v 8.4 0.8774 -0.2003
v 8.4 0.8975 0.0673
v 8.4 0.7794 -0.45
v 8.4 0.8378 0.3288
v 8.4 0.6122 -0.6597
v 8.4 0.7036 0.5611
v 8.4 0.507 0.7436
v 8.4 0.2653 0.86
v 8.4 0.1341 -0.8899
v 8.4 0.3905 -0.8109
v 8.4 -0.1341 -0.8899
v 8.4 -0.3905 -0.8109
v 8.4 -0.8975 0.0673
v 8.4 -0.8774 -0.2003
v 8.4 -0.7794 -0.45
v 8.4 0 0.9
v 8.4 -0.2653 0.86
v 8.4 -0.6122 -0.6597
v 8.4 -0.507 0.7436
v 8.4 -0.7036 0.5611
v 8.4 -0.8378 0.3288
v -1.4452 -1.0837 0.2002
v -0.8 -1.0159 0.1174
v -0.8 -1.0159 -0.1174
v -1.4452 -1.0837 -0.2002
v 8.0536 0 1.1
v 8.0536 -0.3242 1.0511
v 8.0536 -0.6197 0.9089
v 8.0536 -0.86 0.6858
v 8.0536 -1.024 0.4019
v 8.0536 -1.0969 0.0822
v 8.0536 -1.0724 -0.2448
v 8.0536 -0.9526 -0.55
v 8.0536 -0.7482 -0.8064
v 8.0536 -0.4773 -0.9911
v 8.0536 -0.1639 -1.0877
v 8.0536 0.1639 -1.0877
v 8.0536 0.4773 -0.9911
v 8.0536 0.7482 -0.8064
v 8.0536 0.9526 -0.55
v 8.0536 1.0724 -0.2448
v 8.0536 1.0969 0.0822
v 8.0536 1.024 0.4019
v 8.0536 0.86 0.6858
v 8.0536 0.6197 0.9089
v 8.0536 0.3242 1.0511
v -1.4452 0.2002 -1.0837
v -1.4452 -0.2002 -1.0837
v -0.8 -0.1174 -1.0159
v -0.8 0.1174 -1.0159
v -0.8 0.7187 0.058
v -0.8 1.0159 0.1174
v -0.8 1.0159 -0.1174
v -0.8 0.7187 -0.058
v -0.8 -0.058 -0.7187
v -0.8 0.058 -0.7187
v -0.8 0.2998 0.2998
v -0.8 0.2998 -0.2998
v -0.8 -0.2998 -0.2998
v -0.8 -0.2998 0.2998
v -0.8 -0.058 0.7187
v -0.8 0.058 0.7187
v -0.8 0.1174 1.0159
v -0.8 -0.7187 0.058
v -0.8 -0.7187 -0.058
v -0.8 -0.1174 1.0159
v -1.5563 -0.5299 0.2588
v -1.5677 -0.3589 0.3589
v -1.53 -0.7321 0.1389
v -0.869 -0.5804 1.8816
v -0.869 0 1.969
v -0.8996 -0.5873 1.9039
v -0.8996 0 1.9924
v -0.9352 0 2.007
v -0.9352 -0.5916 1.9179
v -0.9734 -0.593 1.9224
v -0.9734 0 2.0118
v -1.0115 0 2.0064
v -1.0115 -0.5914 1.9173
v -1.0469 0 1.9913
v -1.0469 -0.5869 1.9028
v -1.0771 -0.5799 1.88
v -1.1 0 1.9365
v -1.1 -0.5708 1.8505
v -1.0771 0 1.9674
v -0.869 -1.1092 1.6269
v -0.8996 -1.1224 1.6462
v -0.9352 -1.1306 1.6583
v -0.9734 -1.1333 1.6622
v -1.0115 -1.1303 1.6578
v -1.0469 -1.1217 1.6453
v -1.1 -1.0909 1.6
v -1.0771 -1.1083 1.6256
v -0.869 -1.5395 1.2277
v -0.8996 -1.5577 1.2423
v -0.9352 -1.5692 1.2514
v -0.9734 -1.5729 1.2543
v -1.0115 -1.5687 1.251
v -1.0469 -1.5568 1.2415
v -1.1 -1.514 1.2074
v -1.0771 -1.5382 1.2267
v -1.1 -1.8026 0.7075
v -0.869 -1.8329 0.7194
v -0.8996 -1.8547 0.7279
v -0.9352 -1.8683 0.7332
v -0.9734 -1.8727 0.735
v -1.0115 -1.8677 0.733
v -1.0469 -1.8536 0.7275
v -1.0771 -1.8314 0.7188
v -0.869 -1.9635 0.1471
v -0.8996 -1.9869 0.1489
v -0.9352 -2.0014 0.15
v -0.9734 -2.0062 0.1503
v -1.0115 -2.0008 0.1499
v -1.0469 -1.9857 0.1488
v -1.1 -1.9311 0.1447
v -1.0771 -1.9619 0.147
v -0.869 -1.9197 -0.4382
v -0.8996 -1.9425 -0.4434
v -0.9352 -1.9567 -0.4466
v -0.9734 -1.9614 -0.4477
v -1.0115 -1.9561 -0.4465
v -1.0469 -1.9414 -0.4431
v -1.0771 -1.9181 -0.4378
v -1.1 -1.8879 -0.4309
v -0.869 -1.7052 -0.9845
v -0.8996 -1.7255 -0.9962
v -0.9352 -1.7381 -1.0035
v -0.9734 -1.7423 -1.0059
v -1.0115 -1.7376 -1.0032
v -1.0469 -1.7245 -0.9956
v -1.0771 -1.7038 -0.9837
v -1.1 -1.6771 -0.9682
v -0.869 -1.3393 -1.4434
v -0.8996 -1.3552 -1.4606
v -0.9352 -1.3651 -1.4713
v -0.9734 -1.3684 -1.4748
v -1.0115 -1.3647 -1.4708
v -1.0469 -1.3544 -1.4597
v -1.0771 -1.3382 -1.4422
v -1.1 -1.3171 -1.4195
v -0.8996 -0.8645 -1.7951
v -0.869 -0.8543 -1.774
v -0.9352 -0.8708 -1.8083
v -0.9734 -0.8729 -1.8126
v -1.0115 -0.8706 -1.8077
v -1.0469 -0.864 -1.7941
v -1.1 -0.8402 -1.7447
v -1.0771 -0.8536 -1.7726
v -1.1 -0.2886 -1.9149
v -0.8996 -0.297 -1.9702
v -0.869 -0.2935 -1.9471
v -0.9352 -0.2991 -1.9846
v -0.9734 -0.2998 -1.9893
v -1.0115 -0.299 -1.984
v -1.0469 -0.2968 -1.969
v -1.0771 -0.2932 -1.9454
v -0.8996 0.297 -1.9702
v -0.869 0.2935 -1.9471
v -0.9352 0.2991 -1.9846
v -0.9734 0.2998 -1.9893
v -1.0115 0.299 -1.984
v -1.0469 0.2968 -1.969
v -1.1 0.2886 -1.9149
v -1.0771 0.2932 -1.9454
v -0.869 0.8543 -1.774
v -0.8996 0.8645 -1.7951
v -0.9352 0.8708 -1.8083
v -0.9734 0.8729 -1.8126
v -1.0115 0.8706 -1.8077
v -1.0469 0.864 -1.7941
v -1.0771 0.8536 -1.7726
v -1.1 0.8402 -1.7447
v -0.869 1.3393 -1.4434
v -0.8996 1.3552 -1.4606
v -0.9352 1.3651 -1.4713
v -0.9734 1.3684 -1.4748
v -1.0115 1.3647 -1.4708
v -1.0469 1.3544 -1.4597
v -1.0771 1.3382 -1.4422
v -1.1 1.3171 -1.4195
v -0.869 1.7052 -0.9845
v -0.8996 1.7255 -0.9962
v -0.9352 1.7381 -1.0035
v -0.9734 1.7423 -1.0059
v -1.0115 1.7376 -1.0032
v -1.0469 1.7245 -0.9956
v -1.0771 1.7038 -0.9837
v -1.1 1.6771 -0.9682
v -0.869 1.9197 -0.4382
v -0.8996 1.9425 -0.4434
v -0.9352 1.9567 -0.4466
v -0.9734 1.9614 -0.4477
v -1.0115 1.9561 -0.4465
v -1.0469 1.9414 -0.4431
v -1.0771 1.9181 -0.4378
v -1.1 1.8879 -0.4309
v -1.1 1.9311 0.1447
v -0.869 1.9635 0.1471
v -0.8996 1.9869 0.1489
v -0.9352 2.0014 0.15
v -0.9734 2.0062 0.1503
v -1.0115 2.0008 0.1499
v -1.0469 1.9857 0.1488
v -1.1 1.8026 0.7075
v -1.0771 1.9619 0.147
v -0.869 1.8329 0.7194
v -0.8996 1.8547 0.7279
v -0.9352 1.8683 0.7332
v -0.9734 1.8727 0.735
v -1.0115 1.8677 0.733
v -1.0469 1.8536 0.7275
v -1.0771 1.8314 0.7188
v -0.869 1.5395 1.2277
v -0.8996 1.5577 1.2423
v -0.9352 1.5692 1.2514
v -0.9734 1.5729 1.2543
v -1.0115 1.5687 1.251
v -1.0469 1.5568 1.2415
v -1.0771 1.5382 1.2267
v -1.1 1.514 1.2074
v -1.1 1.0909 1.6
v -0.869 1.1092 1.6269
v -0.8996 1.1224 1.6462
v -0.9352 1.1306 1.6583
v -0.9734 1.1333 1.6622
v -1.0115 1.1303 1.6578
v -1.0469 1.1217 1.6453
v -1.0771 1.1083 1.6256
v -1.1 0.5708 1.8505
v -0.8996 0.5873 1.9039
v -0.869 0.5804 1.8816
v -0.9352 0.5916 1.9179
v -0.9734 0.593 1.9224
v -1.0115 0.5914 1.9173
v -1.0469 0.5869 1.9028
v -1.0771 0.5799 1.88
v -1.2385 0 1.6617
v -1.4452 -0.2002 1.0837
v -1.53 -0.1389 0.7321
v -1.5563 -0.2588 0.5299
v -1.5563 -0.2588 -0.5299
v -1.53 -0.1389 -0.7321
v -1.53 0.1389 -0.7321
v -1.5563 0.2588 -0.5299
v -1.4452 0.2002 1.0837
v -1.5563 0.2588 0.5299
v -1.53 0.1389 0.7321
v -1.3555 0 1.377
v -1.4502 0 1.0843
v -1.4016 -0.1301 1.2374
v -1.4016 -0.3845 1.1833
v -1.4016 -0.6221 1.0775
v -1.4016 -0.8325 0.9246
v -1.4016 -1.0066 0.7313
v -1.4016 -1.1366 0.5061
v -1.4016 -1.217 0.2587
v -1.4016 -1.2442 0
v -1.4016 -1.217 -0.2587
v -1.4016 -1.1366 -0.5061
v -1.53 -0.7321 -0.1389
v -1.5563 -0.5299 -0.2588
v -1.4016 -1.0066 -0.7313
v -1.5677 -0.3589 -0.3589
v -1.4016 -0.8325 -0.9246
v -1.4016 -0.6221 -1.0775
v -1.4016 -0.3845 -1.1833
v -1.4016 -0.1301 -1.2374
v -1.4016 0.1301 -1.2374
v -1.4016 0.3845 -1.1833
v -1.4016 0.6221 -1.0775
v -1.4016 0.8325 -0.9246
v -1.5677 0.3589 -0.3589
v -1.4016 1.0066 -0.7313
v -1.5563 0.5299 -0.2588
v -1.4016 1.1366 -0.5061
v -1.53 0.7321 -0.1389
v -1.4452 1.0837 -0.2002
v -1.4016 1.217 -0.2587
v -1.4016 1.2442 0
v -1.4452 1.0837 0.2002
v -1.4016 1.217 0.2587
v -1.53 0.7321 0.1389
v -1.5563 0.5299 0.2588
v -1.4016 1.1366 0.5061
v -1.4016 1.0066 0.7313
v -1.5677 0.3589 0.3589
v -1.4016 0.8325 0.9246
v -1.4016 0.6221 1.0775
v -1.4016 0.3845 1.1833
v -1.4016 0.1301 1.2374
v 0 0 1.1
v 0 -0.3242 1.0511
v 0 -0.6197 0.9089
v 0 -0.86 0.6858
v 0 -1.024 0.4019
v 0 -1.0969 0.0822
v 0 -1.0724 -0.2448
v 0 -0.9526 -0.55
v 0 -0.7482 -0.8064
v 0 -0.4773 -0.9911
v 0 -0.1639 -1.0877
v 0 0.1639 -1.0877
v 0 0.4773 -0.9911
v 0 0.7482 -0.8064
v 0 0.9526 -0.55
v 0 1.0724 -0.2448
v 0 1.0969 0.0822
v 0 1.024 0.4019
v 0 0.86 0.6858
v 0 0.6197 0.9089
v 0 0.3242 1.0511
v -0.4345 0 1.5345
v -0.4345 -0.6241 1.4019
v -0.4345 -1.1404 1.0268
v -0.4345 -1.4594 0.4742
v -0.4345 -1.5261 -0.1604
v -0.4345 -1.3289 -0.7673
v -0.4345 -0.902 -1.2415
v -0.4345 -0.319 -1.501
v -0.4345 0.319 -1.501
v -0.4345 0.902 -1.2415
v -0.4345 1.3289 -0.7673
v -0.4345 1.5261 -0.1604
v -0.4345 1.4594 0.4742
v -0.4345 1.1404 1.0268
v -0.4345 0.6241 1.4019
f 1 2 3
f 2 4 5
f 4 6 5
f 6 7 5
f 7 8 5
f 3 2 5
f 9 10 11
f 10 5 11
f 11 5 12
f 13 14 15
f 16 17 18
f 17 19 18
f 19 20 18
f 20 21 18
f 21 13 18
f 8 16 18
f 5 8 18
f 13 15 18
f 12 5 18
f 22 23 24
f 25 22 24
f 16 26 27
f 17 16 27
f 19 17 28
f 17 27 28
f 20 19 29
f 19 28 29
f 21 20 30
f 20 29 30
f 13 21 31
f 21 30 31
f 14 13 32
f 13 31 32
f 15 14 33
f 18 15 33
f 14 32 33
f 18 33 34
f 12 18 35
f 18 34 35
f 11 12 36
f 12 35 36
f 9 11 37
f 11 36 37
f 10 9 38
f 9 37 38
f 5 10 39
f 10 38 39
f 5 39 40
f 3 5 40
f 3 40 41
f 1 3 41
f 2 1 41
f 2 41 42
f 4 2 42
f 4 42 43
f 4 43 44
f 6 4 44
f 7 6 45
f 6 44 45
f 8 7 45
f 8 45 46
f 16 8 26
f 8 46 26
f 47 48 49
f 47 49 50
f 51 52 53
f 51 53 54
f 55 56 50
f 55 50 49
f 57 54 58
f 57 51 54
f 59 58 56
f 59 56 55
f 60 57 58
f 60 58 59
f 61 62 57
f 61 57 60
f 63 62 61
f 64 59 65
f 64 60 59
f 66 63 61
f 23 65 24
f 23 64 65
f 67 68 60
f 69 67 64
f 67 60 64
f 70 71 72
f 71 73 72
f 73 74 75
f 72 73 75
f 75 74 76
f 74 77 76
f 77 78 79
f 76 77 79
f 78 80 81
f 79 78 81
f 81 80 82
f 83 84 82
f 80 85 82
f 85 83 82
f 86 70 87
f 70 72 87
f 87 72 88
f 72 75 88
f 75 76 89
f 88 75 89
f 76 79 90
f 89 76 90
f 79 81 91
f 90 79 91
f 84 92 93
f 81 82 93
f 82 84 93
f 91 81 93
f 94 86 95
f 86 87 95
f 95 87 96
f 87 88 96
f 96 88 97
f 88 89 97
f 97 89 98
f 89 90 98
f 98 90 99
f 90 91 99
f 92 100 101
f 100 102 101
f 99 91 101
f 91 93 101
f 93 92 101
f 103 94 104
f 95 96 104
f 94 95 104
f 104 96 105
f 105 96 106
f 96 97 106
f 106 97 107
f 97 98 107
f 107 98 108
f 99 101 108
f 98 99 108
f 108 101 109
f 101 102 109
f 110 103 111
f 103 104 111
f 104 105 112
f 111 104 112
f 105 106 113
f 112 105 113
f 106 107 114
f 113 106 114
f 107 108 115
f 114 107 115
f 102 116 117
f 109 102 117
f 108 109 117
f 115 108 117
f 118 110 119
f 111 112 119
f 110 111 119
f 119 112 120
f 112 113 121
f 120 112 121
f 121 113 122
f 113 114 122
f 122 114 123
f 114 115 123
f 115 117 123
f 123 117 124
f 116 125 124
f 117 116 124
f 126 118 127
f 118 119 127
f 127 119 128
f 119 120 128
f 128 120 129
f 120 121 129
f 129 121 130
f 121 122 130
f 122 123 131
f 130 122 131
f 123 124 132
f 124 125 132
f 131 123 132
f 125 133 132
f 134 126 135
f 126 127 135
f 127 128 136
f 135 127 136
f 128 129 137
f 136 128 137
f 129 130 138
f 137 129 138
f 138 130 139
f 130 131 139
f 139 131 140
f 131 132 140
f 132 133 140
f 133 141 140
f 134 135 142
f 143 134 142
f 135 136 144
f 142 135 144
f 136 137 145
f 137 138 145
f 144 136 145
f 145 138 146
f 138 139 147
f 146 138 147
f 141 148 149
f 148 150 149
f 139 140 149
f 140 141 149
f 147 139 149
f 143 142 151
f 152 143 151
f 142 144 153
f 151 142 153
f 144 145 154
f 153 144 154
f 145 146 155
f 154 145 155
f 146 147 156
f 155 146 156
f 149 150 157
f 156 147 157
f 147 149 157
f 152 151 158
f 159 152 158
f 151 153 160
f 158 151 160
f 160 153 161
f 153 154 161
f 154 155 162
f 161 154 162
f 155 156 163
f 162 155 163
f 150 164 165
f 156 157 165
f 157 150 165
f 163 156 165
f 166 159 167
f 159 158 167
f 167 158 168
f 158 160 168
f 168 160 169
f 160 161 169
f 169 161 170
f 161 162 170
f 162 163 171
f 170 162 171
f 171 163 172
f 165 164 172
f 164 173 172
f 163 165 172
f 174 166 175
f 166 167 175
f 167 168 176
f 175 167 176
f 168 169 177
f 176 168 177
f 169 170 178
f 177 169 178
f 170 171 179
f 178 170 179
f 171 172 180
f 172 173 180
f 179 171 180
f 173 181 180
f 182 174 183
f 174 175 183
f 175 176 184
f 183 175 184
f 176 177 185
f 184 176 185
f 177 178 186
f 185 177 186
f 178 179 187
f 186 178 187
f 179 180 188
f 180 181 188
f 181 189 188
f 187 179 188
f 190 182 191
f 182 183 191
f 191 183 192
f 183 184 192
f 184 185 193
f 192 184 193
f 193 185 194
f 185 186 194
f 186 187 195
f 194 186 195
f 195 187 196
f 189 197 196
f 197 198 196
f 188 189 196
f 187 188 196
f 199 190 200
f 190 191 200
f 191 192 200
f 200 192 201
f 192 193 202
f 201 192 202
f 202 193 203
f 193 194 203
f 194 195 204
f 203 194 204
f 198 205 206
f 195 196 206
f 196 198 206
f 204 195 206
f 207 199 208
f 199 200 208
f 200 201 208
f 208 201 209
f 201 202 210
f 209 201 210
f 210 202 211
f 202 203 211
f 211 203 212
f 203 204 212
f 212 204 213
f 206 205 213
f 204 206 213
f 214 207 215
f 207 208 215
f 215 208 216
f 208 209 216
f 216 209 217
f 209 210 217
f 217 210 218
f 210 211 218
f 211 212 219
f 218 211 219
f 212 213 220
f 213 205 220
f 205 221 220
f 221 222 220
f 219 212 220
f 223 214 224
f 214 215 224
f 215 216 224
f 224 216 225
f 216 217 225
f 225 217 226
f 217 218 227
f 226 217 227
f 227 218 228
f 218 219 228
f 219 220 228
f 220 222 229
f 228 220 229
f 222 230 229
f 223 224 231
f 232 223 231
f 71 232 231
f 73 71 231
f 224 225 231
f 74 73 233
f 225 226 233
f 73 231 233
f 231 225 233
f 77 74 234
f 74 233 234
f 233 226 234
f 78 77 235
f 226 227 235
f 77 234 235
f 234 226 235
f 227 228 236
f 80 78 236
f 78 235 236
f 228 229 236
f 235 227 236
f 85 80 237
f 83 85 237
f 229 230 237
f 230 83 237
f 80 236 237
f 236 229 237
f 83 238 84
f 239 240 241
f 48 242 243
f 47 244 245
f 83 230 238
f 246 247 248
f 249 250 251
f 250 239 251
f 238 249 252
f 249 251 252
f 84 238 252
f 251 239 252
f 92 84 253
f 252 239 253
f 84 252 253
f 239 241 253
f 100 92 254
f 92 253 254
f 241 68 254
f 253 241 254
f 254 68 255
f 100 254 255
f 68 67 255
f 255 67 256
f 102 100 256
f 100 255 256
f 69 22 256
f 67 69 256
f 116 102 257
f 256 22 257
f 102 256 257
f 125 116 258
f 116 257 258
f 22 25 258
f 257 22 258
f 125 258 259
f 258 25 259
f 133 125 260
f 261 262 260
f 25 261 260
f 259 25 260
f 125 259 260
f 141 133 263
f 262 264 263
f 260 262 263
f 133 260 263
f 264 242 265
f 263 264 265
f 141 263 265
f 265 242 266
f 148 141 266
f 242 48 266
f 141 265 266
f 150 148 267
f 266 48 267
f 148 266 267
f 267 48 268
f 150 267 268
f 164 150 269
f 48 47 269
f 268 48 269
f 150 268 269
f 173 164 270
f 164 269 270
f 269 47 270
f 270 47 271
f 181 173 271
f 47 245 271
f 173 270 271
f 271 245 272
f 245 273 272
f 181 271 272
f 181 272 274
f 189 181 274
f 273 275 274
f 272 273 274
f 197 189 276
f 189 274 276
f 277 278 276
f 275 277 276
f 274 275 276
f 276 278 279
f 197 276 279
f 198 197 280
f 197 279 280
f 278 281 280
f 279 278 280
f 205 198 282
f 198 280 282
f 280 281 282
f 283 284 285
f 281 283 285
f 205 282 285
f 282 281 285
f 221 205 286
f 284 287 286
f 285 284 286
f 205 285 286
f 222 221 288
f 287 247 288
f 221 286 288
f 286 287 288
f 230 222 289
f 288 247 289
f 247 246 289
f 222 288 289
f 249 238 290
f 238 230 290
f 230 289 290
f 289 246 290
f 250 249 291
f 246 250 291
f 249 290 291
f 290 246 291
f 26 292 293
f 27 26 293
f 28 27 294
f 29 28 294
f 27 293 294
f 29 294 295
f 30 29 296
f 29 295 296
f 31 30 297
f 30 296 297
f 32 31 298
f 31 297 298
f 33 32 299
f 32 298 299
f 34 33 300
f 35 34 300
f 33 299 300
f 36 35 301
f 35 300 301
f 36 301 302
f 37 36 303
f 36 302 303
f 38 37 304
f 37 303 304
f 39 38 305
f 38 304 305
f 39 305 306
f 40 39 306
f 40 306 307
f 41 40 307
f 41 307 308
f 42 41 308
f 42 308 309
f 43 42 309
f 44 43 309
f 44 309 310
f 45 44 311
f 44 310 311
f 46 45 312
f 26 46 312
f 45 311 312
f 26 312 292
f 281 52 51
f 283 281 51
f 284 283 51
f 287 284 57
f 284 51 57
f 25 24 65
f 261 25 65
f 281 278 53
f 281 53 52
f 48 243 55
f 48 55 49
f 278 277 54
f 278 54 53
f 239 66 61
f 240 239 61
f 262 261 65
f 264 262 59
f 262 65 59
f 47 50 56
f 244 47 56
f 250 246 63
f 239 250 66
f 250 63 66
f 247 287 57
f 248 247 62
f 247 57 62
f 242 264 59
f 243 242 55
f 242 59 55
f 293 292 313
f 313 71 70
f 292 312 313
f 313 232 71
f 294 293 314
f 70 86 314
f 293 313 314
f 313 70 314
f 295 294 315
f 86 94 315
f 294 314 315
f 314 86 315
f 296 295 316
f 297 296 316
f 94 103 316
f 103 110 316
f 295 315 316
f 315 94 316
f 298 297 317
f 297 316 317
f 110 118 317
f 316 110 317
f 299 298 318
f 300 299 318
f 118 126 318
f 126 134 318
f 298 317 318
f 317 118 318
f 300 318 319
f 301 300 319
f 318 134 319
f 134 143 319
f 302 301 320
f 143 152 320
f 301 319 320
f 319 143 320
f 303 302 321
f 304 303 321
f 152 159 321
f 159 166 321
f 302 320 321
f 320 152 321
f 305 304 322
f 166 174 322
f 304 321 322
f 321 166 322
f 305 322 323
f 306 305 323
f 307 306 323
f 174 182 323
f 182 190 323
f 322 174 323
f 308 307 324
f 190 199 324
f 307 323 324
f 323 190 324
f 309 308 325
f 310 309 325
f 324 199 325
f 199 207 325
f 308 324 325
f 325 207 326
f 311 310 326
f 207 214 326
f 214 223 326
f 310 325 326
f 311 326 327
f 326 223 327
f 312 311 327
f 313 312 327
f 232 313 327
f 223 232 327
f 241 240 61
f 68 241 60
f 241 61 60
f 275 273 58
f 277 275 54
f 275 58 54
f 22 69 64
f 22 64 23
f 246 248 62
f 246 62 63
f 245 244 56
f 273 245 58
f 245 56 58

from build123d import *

# Parameters (mm, degrees)
CHAMFER1_SIZE      = 0.2
CHAMFER1_SIZE2     = 0.346410162
CUT_EXTRUDE1_DEPTH = 0.8
CUT_EXTRUDE1_TAPER = 6


with BuildPart() as part:
    # Sketch1 → Revolve1 (revolve)
    with BuildSketch(Plane.XY, mode=Mode.PRIVATE) as revolve1_sk:
        with BuildLine():
            Line((-1.6, 0), (8.4, 0))
            Line((8.4, 0), (8.4, 1.1))
            Line((8.4, 1.1), (0, 1.1))
            Line((0, 1.1), (-0.869043005, 1.969043005))
            ThreePointArc((-0.869043005, 1.969043005), (-0.992640239, 2.010371092), (-1.1, 1.936491673))
            ThreePointArc((-1.1, 1.936491673), (-1.472983346, 1), (-1.6, 0))
        make_face()
    revolve(revolve1_sk.sketch.rotate(Axis((0, 0, 0), (1, 0, 0)), 90), axis=Axis((0, 0, 0), (1, 0, 0)))

    # Chamfer1
    chamfer1_edges = [part.edges().sort_by_distance(p)[0] for p in [
        (8.4, 0, -1.1),
    ]]
    chamfer1_side = [part.faces().sort_by_distance(p)[0] for p in [
        (8.4, 0, 0),
    ]]
    chamfer(chamfer1_edges, length=CHAMFER1_SIZE, length2=CHAMFER1_SIZE2, reference=chamfer1_side[0])

    # Sketch3 → Cut-Extrude1 (cut)
    with BuildSketch(Plane(origin=(-1.6, 0, 0), x_dir=(0, 0, -1), z_dir=(1, 0, 0))):
        Polygon((-0.22, 1.1), (-0.146666667, 0.733333333), (-0.36140157, 0.36140157), (-0.733333333, 0.146666667), (-1.1, 0.22), (-1.1, -0.22), (-0.733333333, -0.146666667), (-0.36140157, -0.36140157), (-0.146666667, -0.733333333), (-0.22, -1.1), (0.22, -1.1), (0.146666667, -0.733333333), (0.36140157, -0.36140157), (0.733333333, -0.146666667), (1.1, -0.22), (1.1, 0.22), (0.733333333, 0.146666667), (0.36140157, 0.36140157), (0.146666667, 0.733333333), (0.22, 1.1), align=None)
    extrude(amount=CUT_EXTRUDE1_DEPTH, taper=CUT_EXTRUDE1_TAPER, mode=Mode.SUBTRACT)


solid = part.part
